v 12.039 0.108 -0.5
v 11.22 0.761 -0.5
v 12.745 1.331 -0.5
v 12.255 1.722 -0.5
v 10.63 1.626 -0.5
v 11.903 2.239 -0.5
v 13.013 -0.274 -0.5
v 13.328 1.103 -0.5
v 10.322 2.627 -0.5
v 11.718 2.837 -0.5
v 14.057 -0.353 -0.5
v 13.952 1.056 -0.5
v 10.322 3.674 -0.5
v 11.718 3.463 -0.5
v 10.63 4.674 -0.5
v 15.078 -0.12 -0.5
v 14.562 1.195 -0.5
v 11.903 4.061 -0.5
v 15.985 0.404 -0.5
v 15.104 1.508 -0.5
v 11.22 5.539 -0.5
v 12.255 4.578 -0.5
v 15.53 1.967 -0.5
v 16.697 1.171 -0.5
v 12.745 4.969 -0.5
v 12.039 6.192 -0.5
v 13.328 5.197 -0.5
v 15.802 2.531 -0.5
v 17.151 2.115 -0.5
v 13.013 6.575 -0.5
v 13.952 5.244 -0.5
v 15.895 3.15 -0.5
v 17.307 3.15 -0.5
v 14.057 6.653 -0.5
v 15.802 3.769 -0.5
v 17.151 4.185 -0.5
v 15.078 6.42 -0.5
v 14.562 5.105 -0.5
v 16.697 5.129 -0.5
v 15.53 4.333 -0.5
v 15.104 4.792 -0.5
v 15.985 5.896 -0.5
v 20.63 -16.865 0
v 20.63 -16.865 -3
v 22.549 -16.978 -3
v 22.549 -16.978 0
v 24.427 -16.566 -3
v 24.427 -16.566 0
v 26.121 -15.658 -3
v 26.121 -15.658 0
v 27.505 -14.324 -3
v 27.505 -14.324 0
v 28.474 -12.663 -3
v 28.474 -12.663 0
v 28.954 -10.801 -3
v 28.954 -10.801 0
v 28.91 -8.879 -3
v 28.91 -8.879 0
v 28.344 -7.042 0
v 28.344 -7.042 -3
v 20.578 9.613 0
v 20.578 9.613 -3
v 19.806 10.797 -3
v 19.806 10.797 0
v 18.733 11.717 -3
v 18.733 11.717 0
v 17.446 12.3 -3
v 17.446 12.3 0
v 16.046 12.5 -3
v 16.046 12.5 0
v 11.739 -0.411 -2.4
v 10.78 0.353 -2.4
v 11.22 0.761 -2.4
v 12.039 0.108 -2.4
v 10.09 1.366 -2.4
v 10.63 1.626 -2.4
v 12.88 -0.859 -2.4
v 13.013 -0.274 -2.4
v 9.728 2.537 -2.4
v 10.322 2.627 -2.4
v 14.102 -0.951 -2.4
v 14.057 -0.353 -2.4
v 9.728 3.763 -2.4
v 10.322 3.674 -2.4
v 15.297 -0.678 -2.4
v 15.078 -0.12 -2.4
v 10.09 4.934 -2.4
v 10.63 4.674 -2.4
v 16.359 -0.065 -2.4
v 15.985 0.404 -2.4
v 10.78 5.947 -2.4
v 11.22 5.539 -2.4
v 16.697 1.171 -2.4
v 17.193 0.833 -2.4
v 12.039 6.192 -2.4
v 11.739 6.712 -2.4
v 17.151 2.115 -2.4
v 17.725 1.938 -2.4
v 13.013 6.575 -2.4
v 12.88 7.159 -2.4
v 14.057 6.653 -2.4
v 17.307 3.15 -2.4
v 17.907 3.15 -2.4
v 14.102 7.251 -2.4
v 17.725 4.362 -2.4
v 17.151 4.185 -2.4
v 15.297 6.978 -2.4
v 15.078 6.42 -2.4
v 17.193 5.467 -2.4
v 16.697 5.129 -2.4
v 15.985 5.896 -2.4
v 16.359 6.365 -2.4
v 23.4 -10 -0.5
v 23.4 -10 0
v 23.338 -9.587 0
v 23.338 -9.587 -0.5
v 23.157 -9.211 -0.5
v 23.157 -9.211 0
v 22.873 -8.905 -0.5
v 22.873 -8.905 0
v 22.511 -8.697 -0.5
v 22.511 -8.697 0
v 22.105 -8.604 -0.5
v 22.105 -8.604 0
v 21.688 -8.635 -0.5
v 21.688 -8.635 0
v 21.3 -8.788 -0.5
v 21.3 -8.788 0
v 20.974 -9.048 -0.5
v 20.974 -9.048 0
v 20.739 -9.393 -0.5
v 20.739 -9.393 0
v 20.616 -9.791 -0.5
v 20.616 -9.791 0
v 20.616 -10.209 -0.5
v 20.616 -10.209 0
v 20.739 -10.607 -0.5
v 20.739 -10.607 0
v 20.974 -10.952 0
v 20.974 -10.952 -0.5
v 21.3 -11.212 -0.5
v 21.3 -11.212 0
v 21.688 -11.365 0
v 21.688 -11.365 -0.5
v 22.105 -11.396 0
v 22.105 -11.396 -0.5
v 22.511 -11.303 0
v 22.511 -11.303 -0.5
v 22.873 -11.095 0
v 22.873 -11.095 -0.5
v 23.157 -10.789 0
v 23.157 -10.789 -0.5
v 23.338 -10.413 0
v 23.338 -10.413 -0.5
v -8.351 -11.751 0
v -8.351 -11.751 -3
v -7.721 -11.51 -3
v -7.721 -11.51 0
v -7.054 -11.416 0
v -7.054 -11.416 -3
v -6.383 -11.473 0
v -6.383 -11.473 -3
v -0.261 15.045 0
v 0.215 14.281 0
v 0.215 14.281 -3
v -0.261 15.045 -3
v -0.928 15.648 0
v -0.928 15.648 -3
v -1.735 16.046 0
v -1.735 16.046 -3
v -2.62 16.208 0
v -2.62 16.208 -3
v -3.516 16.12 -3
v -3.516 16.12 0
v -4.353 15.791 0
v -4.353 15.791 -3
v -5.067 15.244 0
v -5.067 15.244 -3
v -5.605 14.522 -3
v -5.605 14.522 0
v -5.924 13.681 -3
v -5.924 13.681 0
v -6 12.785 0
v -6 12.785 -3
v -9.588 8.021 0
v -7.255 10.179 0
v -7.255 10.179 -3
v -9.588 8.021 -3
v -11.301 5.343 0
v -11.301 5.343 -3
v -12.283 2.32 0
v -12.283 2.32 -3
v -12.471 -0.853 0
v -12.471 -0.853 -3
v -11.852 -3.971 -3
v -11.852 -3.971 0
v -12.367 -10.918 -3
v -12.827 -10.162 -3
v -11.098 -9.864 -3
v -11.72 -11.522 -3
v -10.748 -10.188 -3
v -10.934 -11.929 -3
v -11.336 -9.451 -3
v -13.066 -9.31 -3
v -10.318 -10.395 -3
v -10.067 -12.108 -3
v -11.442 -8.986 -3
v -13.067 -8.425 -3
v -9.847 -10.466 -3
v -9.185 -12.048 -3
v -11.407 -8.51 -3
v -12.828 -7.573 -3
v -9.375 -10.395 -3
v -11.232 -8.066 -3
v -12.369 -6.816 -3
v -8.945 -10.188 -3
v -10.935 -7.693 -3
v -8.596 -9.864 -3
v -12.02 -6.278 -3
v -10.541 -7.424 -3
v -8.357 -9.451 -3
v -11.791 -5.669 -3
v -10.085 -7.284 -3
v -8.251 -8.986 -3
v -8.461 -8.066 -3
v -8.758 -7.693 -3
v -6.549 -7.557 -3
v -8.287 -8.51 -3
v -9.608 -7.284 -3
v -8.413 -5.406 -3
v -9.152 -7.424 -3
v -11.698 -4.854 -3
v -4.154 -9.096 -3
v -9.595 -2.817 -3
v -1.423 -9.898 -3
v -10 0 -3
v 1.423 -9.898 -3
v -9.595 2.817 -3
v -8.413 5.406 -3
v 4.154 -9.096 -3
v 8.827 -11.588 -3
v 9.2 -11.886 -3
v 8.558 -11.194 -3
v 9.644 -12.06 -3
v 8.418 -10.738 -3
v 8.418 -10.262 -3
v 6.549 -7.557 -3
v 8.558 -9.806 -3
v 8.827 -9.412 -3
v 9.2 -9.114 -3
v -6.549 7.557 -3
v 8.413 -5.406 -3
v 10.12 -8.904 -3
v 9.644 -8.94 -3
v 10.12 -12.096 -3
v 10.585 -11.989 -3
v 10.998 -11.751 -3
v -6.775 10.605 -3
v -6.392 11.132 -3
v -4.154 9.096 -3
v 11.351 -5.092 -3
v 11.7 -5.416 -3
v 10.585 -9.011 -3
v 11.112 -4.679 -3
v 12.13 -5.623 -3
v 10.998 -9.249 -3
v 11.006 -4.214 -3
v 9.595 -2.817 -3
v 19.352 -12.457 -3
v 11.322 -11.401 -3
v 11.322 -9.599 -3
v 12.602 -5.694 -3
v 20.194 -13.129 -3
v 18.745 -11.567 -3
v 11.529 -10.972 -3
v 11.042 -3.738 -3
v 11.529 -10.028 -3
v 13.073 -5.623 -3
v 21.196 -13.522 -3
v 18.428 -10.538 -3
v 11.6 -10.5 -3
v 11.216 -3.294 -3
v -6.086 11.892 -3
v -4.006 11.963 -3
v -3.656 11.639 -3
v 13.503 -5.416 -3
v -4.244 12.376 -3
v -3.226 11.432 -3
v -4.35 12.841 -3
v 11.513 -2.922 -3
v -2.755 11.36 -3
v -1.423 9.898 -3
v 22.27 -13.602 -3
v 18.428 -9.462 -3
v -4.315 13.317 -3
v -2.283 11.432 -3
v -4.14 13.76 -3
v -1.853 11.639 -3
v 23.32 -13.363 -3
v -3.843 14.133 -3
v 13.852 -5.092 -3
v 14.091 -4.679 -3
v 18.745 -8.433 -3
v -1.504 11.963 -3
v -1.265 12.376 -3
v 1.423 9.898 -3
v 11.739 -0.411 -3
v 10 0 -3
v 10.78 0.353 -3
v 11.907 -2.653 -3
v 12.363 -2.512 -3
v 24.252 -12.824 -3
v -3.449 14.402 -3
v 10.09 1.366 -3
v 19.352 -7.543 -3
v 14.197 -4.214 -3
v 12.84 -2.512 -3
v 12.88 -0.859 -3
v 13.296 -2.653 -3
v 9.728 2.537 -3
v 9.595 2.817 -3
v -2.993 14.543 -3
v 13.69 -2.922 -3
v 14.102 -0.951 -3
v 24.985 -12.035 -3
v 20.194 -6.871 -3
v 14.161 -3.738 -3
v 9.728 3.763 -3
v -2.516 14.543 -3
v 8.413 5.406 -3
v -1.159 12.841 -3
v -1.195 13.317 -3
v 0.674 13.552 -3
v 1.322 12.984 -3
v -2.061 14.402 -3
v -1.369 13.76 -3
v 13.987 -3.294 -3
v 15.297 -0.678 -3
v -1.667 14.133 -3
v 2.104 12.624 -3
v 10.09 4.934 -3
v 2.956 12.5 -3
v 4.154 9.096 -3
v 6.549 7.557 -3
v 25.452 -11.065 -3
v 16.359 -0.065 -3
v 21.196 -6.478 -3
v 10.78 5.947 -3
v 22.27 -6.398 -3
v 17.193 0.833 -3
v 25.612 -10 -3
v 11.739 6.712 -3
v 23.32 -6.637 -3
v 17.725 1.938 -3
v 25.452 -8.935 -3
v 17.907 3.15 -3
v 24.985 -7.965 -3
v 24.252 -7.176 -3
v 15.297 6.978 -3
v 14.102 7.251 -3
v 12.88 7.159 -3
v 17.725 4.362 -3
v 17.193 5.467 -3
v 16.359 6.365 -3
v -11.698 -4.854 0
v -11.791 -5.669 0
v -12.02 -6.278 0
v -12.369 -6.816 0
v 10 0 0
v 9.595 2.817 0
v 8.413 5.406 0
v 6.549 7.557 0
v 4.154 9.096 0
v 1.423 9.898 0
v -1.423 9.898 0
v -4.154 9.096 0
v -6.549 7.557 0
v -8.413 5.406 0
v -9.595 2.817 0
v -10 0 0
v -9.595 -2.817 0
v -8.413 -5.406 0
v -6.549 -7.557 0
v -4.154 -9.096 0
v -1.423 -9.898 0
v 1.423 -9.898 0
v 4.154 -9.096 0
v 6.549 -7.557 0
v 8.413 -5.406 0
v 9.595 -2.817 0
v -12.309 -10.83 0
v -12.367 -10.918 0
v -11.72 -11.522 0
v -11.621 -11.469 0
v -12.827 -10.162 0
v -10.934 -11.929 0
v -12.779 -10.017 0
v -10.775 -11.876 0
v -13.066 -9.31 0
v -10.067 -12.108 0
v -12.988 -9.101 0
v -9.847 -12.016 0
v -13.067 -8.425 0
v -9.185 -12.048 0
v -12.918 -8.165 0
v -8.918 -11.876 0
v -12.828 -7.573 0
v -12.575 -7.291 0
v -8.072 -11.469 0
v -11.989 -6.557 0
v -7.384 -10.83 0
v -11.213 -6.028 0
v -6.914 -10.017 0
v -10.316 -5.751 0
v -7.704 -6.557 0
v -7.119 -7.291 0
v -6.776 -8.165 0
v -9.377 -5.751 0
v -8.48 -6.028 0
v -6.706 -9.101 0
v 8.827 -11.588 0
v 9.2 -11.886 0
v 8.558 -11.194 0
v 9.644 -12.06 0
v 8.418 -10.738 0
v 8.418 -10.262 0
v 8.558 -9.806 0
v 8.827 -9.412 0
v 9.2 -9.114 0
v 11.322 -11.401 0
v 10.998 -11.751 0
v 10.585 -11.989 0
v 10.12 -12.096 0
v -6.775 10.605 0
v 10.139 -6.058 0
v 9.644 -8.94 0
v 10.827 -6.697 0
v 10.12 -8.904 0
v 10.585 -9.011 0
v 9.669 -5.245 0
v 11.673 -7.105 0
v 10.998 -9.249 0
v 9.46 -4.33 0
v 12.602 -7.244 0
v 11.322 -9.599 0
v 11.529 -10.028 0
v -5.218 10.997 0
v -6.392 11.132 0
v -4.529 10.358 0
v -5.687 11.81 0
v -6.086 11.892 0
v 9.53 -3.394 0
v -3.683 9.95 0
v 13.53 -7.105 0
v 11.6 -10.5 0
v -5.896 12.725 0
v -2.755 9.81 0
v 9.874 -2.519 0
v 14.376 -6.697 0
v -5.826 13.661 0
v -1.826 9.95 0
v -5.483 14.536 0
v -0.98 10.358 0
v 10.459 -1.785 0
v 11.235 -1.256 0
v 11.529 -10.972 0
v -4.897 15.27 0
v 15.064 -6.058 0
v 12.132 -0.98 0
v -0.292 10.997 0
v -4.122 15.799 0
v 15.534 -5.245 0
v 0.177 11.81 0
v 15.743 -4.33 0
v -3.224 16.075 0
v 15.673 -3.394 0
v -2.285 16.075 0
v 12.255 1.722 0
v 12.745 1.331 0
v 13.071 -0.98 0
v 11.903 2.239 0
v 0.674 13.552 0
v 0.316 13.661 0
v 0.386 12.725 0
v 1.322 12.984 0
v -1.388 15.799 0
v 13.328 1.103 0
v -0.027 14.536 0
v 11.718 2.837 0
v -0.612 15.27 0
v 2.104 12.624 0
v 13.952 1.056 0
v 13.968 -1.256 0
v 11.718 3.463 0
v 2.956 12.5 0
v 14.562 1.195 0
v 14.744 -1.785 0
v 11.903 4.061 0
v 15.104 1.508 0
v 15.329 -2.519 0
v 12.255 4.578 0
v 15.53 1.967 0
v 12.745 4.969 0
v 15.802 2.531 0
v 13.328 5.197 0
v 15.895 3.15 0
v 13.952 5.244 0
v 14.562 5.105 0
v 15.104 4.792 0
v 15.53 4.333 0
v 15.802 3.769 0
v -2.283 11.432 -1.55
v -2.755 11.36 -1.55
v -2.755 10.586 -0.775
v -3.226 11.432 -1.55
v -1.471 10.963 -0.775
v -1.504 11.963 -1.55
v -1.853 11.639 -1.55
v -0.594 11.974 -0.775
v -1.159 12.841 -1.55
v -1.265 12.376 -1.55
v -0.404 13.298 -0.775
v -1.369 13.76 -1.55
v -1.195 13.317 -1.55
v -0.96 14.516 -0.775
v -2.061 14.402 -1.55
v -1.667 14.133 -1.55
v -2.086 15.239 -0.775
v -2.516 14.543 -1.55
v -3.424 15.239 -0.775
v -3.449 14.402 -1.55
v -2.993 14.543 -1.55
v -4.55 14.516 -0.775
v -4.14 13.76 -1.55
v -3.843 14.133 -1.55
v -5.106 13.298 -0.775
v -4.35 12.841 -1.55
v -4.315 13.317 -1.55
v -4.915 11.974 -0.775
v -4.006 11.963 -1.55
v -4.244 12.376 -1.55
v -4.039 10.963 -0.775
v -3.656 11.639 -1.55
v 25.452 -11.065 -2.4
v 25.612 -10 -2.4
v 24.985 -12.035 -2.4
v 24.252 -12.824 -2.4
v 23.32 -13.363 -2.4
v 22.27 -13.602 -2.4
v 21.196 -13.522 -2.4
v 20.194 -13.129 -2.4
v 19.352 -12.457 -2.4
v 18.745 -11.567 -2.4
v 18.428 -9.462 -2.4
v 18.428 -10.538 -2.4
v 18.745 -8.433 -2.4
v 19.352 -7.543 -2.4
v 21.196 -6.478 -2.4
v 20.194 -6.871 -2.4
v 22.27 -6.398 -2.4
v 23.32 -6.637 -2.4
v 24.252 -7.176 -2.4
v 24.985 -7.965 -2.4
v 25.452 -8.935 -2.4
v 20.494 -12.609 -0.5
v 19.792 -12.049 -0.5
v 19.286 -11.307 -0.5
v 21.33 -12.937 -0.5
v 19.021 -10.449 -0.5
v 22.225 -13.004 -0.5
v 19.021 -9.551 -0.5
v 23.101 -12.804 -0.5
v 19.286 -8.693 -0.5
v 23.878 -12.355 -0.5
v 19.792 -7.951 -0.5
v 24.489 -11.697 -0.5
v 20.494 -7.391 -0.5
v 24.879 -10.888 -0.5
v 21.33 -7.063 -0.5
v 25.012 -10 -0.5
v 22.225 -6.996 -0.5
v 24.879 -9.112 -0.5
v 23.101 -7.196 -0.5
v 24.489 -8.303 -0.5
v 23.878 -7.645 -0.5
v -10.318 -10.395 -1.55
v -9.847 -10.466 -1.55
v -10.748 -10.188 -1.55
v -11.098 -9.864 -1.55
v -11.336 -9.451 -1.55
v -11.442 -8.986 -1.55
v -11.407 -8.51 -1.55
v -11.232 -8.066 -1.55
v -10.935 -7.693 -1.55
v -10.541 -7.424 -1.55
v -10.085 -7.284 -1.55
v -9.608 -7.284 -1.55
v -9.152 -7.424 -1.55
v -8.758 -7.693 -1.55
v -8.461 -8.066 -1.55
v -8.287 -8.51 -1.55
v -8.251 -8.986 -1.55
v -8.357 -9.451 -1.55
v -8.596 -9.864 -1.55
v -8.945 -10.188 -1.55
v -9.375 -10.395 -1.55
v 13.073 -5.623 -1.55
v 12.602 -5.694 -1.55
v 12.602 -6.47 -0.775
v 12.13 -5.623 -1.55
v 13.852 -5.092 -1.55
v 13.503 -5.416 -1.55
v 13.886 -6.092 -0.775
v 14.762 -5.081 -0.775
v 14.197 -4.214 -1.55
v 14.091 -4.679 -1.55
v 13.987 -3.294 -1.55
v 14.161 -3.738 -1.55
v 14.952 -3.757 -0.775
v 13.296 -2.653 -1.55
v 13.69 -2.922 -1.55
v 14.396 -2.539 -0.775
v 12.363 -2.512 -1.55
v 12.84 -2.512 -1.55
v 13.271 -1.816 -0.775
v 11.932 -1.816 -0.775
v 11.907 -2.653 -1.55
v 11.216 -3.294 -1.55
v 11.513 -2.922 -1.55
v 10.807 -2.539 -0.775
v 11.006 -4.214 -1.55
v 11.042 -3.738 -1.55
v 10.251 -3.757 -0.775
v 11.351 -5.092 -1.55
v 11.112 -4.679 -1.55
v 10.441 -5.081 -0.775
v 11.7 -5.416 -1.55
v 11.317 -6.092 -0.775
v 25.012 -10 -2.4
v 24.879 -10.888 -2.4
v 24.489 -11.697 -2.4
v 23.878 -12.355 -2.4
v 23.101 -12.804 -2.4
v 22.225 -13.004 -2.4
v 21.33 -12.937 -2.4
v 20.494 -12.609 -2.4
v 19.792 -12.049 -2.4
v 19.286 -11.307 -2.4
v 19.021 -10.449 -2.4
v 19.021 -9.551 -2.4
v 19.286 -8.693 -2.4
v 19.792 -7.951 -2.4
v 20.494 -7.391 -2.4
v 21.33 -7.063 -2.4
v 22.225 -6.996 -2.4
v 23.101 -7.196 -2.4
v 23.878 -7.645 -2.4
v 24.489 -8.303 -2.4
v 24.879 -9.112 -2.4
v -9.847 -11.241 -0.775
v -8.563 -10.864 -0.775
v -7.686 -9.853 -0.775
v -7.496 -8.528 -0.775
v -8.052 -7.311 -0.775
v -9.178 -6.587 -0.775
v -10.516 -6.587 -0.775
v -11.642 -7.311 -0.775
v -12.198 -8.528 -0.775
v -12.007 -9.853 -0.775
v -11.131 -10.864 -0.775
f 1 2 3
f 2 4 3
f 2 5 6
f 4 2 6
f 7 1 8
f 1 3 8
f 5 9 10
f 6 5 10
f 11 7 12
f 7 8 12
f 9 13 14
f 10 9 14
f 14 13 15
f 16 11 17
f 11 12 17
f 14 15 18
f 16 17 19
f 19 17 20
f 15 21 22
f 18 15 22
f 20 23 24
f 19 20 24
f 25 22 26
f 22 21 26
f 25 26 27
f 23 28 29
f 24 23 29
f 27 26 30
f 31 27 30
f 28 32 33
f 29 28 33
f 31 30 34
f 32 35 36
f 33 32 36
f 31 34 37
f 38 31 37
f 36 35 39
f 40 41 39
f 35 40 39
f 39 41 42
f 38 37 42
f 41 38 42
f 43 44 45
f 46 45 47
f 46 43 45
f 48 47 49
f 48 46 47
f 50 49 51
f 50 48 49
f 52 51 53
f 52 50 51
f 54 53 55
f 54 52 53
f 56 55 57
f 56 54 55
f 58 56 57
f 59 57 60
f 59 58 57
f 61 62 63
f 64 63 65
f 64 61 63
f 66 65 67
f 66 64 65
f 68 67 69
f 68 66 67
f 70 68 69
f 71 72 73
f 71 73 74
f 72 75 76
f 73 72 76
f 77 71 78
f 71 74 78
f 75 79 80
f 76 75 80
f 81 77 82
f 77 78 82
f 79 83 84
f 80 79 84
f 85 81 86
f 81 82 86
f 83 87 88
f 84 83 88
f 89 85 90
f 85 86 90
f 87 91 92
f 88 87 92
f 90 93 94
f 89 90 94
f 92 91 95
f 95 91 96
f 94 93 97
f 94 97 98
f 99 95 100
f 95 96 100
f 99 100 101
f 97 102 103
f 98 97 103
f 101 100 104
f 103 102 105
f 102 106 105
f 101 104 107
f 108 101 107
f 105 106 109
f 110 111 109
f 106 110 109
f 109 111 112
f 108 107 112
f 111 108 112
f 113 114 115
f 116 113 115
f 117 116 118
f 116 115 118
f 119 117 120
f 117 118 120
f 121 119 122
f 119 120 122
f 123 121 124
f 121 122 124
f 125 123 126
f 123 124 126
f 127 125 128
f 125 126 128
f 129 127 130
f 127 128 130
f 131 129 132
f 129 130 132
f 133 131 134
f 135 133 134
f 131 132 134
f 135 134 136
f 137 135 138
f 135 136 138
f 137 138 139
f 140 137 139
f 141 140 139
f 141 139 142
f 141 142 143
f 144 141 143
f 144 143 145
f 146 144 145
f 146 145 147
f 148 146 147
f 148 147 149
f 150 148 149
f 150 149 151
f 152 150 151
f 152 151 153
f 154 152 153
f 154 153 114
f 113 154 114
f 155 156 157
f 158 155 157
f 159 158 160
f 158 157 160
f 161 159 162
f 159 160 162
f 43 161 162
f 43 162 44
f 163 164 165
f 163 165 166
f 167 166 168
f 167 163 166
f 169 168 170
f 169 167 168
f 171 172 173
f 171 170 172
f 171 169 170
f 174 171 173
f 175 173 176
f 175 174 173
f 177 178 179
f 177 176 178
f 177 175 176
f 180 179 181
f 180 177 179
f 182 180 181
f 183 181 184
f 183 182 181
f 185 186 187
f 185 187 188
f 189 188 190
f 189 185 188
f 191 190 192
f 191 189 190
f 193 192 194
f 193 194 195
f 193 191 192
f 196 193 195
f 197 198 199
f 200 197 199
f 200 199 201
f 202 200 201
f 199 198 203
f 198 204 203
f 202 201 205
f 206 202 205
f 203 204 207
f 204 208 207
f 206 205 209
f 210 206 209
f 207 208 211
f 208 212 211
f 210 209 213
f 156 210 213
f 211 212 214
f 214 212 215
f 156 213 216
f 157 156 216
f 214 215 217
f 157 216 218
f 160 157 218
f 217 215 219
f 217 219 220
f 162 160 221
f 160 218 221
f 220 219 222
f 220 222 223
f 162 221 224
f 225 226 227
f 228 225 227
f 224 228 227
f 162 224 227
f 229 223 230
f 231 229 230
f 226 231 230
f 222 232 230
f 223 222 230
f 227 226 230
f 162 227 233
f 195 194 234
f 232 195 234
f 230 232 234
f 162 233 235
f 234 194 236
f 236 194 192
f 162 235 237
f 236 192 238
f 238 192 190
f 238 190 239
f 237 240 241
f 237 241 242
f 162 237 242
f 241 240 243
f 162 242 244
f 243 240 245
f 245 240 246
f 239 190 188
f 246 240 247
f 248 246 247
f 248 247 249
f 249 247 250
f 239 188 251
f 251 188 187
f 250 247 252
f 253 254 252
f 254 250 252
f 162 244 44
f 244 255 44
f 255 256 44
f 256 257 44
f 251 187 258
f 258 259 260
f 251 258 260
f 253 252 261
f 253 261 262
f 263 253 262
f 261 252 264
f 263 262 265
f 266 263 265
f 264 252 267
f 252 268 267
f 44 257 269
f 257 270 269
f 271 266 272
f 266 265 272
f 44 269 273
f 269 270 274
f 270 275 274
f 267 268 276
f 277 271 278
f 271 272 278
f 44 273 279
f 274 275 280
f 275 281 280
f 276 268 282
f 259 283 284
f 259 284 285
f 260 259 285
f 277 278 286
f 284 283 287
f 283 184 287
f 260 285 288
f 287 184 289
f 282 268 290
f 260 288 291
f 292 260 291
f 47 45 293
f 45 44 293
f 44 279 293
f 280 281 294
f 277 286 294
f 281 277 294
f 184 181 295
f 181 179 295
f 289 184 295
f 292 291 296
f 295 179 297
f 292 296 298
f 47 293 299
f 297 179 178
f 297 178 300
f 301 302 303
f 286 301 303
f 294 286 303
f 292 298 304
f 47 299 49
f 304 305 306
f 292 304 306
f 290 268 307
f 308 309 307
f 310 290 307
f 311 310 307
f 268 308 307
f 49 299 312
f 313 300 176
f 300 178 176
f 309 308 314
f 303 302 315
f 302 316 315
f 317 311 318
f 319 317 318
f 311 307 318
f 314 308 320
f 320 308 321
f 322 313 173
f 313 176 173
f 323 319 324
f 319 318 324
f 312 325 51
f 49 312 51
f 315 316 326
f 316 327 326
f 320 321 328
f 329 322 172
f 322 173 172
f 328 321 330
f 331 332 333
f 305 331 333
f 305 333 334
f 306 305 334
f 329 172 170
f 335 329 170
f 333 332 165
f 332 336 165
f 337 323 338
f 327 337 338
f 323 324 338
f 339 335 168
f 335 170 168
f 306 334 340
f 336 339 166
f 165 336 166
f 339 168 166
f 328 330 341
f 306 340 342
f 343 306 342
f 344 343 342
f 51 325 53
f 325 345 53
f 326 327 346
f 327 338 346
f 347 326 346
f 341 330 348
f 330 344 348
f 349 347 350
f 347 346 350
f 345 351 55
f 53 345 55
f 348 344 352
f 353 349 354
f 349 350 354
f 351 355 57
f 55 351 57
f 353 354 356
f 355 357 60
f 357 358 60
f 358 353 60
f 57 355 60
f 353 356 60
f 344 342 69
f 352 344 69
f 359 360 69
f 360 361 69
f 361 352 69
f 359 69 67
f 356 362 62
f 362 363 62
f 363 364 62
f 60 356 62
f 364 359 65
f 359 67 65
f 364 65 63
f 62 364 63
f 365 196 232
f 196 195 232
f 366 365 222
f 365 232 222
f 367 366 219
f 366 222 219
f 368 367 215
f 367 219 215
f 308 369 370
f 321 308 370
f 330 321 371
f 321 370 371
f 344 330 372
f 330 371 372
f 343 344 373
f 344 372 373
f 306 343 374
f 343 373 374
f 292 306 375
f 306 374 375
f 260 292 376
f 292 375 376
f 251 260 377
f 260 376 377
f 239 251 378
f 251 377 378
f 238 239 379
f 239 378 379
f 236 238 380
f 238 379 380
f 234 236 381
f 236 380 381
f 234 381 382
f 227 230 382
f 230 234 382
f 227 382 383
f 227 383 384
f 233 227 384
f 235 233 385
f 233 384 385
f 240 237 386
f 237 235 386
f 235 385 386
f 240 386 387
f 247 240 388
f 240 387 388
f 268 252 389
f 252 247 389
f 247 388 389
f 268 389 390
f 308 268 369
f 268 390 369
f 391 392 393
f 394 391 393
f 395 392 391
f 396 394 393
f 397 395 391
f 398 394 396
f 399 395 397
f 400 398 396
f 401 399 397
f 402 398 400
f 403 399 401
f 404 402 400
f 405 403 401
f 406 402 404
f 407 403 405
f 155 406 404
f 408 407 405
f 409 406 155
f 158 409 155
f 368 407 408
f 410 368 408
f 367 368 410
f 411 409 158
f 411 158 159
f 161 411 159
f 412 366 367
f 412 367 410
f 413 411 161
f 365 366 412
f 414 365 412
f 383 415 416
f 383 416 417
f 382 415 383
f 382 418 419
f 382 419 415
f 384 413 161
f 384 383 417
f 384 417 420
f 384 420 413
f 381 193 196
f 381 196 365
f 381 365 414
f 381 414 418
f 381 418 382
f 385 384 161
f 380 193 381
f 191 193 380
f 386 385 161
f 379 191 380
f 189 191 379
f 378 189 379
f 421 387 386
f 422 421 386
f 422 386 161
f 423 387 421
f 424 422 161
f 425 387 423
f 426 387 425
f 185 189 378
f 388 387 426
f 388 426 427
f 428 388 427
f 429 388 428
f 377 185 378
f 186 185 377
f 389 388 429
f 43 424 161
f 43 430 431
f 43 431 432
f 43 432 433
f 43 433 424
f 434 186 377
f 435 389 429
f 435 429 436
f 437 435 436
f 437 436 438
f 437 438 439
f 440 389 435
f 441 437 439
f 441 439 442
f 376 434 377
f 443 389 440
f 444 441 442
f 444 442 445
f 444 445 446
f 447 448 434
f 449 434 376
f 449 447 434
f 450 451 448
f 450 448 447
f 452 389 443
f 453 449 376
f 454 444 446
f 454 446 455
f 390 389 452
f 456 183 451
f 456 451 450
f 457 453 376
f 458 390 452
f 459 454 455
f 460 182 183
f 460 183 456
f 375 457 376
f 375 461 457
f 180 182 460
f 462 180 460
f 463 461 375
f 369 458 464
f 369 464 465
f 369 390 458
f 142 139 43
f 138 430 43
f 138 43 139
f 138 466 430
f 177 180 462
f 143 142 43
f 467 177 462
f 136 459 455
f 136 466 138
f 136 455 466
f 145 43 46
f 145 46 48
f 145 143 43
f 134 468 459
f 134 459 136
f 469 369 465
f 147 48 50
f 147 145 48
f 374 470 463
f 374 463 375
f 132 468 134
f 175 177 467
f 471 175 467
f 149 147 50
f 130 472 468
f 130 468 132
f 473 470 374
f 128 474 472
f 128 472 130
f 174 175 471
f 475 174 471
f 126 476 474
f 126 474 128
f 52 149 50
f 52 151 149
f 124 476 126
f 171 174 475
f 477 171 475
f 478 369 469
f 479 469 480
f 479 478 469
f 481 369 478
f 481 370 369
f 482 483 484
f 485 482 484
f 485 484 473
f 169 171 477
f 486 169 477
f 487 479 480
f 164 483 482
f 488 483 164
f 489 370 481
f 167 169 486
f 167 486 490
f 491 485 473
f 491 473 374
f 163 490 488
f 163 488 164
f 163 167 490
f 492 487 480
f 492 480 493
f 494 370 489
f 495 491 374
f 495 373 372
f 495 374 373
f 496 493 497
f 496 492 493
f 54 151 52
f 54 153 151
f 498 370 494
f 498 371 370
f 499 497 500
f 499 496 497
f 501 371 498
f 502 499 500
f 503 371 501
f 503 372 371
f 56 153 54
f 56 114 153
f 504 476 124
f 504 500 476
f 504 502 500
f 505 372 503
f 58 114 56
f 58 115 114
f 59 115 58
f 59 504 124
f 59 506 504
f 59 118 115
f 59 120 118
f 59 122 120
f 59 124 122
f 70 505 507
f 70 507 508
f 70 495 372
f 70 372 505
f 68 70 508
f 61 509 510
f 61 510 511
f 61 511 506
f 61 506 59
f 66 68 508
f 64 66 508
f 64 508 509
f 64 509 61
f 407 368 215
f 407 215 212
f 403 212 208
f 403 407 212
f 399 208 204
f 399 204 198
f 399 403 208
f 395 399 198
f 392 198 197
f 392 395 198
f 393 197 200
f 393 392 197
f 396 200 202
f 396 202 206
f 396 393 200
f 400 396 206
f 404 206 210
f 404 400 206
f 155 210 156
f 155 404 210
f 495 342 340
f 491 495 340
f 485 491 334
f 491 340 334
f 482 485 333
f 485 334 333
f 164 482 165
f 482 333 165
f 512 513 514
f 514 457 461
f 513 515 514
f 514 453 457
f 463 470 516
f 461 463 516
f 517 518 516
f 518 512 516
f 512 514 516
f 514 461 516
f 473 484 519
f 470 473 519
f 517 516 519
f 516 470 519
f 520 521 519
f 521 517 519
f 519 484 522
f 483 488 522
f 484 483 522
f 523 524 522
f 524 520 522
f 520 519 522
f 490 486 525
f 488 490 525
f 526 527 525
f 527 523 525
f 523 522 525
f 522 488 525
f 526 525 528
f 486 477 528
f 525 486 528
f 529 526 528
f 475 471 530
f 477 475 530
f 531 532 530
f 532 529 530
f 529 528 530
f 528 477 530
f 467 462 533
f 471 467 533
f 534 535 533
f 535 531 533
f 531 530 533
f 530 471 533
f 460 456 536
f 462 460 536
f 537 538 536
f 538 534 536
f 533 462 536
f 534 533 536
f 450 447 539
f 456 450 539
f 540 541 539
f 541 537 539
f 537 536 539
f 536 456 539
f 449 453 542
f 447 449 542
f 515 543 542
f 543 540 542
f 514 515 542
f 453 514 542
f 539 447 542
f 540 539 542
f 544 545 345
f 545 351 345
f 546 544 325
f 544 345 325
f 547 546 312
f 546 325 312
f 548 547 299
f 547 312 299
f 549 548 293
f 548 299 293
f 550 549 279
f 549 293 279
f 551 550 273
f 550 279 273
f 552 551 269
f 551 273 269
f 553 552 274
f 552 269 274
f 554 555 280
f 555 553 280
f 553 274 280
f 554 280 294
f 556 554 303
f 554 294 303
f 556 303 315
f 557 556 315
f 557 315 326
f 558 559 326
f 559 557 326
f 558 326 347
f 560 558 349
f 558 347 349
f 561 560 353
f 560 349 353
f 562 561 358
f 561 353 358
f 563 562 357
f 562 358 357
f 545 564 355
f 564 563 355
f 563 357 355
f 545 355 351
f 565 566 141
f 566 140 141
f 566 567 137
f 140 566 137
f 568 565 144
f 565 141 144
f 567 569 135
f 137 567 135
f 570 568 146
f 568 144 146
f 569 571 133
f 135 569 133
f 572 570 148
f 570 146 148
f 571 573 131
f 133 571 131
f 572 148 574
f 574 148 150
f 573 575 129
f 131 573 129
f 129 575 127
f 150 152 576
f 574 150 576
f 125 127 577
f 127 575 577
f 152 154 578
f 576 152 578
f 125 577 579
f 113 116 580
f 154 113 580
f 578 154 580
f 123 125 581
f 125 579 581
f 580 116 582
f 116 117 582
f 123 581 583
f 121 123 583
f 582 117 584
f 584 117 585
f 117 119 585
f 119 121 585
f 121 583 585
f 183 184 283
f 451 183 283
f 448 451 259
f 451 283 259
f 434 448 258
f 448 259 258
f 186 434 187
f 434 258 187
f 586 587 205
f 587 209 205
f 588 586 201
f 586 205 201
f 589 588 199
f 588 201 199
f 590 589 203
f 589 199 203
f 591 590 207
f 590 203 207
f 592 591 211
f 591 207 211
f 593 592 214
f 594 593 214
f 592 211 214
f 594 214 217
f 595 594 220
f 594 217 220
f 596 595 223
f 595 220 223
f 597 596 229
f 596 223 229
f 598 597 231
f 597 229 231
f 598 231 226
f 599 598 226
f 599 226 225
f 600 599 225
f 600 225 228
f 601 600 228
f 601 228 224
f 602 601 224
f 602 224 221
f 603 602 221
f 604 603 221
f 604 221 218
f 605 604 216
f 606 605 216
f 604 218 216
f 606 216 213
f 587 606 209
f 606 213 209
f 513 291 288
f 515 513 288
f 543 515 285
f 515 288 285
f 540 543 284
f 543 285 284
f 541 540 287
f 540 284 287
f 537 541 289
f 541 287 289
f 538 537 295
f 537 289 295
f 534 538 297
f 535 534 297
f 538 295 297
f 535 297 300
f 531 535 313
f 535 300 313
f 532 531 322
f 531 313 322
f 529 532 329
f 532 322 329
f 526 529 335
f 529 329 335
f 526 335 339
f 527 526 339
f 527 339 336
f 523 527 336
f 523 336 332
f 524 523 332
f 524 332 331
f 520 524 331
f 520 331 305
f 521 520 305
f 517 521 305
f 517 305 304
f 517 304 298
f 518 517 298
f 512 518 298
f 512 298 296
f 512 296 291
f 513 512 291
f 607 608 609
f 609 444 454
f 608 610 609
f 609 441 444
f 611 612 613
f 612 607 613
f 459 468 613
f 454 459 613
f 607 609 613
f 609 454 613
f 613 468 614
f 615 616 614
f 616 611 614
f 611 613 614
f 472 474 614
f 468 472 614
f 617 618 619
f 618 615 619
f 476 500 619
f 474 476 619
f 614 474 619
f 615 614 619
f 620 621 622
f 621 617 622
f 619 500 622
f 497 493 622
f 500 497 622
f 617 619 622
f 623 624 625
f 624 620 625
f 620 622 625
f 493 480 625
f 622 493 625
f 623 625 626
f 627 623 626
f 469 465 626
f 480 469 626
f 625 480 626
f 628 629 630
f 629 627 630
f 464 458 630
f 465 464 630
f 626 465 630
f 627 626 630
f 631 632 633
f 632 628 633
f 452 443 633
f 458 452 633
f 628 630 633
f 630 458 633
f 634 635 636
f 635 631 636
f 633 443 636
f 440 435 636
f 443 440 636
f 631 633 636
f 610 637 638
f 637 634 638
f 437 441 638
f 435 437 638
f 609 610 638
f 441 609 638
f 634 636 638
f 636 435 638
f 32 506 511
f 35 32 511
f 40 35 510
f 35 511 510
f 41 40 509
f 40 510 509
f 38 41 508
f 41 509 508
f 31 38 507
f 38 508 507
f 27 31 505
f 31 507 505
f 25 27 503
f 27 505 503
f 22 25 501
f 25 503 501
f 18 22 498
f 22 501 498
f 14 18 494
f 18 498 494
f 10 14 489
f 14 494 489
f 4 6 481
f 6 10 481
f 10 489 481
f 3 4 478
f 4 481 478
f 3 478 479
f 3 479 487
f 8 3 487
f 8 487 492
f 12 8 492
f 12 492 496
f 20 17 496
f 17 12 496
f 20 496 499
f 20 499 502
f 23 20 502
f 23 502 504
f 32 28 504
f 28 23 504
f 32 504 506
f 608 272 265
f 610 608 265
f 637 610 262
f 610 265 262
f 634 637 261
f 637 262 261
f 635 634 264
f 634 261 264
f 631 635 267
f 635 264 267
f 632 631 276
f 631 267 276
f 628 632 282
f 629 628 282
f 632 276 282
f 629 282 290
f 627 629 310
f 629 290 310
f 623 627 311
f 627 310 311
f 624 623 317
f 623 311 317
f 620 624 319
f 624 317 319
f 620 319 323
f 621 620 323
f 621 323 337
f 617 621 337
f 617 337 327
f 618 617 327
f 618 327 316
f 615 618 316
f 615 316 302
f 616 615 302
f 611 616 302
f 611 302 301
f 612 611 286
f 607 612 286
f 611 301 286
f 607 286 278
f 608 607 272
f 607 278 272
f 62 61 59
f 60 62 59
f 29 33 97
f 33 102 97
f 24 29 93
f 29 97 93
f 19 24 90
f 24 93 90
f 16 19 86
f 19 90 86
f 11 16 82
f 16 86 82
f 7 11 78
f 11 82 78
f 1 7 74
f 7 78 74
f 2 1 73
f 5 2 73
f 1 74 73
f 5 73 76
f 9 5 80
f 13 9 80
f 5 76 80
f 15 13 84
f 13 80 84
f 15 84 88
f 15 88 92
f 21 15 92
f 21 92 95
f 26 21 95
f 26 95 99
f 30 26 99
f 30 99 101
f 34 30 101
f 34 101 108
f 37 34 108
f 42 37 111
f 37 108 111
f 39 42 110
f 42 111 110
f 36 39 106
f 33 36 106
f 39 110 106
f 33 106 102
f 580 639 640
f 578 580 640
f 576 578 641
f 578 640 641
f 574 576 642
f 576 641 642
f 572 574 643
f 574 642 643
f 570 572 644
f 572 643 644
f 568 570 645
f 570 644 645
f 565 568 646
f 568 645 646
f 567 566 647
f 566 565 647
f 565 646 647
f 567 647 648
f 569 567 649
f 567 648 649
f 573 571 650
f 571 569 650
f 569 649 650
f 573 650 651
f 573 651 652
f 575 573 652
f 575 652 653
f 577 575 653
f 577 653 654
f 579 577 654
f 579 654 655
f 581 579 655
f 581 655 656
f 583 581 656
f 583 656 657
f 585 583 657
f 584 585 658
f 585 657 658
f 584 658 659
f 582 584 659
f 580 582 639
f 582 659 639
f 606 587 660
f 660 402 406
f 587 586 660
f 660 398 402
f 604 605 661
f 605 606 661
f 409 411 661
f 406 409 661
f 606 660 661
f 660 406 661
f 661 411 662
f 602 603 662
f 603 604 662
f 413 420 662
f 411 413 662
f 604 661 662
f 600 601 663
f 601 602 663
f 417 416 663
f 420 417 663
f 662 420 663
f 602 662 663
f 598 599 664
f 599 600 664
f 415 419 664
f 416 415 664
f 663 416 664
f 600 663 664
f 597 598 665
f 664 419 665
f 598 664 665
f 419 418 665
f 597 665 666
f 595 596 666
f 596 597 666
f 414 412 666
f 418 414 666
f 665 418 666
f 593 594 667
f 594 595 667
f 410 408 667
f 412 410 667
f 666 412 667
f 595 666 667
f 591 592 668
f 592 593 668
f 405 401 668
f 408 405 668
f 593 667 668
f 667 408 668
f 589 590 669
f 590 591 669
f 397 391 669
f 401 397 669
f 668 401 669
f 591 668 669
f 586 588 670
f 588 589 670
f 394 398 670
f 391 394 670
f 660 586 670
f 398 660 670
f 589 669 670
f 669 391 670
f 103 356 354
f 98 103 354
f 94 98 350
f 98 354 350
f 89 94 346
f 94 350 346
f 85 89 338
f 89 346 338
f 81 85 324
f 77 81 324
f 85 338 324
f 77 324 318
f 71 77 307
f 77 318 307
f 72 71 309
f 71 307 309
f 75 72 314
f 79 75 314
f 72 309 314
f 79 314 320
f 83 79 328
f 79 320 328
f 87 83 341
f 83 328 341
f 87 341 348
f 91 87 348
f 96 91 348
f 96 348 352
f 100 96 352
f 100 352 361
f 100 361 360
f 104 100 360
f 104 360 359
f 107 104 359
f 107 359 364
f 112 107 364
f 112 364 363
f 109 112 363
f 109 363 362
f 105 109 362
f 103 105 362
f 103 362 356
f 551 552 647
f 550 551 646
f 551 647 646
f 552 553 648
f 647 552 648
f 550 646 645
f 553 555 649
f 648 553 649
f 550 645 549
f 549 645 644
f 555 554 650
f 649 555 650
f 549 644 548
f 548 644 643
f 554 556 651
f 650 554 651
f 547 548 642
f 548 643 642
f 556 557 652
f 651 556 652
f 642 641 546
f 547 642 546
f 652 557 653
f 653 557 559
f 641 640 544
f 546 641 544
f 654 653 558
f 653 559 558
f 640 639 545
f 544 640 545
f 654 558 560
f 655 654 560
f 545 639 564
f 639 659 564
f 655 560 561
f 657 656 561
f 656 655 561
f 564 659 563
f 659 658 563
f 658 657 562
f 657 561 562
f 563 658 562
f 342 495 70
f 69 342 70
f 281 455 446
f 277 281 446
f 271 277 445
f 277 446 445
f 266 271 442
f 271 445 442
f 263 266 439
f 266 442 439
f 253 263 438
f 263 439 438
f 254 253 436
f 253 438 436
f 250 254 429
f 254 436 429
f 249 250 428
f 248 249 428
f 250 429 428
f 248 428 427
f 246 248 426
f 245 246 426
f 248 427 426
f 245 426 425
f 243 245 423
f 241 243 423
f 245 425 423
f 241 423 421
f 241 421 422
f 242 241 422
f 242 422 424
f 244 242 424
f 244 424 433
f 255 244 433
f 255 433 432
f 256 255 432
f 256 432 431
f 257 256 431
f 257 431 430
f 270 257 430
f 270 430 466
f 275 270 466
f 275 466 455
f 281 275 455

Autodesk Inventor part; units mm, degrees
ref_plane "YZ Plane" through (0, 0, 0) normal (1, 0, 0) x (0, 1, 0)
ref_plane "XZ Plane" through (0, 0, 0) normal (0, 1, 0) x (-1, 0, 0)
ref_plane "XY Plane" through (0, 0, 0) normal (0, 0, 1) x (1, 0, 0)
sketch "Sketch1" plane through (0, 0, 0) normal (0, 0, 1) x (1, 0, 0)
  circle A0 centre (0, 0) radius 10
  circle A1 centre (0, 0) radius 12.5
  circle A2 centre (0, 0) radius 4.9 construction
  circle A3 centre (0, 0) radius 2.6
  circle A4 centre (22, -10) radius 6.25 construction
  circle A5 centre (13.7949, 3.1501) radius 9.25 construction
  circle A6 centre (22, -10) radius 7
  circle A7 centre (10, -10.5) radius 1.6
  circle A8 centre (10, -10.5) radius 3.75
  line L0 (-7.6132, -11.2269) -> (20.6297, -16.8646)
  line L1 (0, 12.5) -> (16.0464, 12.5)
  line L2 (20.5779, 9.6131) -> (28.3442, -7.0417)
  arc A9 (20.5779, 9.6131) -> (16.0464, 12.5) centre (16.0464, 7.5) ccw
  circle A10 centre (13.7949, 3.1501) radius 2.1
  circle A11 centre (13.7949, 3.1501) radius 3.5125
  circle A12 centre (13.7949, 3.1501) radius 4.1125
  circle A13 centre (22, -10) radius 1.4
  circle A14 centre (22, -10) radius 3.0125
  circle A15 centre (22, -10) radius 3.6125
  circle A16 centre (-9.8467, -8.866) radius 3.25
  circle A17 centre (-9.8467, -8.866) radius 1.6
  circle A18 centre (12.6015, -4.0945) radius 3.25
  circle A19 centre (12.6015, -4.0945) radius 1.6
  circle A20 centre (-2.7548, 12.9605) radius 3.25
  circle A21 centre (-2.7548, 12.9605) radius 1.6
  line L3 (0, 0) -> (-9.2893, -8.3641) construction
  line L4 (0, 0) -> (12.5, 0) construction
  arc A22 (9.6868, -12.069) -> (10.3132, -8.931) centre (10, -10.5) ccw
  point P0 (-2.4469, -12.2582)
  point P1 (0.4624, 12.5)
  point P2 (-5.502, 11.224)
  point P3 (-11.0485, -5.8464)
  point P4 (-6.9692, -10.3769)
  dimension "d33" = 6.5
  dimension "d0" = 20
  dimension "d1" = 25
  dimension "d2" = 9.8
  dimension "d3" = 5.2
  dimension "d4" = 22
  dimension "d5" = 10
  dimension "d6" = 12.5
  dimension "d7" = 18.5
  dimension "d8" = 14
  dimension "d9" = 3.2
  dimension "d10" = 10.5
  dimension "d11" = 10
  dimension "d12" = 7.5
  dimension "d13" = 115
  dimension "d14" = 5
  dimension "d15" = 4.2
  dimension "d16" = 7.025
  dimension "d17" = 8.225
  dimension "d18" = 2.8
  dimension "d19" = 6.025
  dimension "d20" = 7.225
  dimension "d34" = 3.2
  dimension "d37" = 360
  dimension "d39" = 12.5
  dimension "d40" = 138
extrude "Extrusion1" add sketch "Sketch1" against normal blind 3 contours A0 A20 A1 A12 A18 | A0 A16 A1 A20 | A20 A1 A21 | A18 A1 A8 A16 A0 | A18 A1 A19 | A16 A1 A17 | A20 L1 A1 A21 | A20 L1 A9 L2 A6 L0 A1 A8 A18 A12 | A1 L1 A20 | A18 A12 A8 A1 A19 | A1 A12 A18 | A18 A8 A1 | A1 A17 A16 | A21 A1 | A1 A21 | A12 A18 A1 A11 | A1 A11 A12 | A19 A1 | A1 A19 | A18 A12 | A8 A18 A1 | A1 A8 | A8 A18 | A1 L0 A16 | A17 A1 | A1 A17 | A11 A1 A10 | A1 A10 A11 | A6 | A14 | A15
extrude "Extrusion2" cut sketch "Sketch1" along normal blind 0.6 from surface at -3 contours A12 A18 A1 A11 | A1 A11 A12 | A18 A12 | A15
extrude "Extrusion3" cut sketch "Sketch1" along normal blind 2.5 from surface at -3 contours A11 A1 A10 | A1 A10 A11 | A14
fillet "Fillet1" radius 3 4 edges at (-11.0485, -5.8464, -1.5) (-5.502, 11.224, -1.5) (0.4624, 12.5, -1.5) (-7.6132, -11.2269, -1.5)
hole "Hole1" at (-2.7548, 12.9605, 0) at (-9.8467, -8.866, 0) at (12.6015, -4.0945, 0) direction (0, 0, -1) diameter 3.2 depth 6 countersink diameter 6.3 countersink angle 90 clearance for "Countersunk Flat Head Screw DIN EN ISO 2009" size "M3" standard "DIN"
properties part number "Dribbler Bracket A"
